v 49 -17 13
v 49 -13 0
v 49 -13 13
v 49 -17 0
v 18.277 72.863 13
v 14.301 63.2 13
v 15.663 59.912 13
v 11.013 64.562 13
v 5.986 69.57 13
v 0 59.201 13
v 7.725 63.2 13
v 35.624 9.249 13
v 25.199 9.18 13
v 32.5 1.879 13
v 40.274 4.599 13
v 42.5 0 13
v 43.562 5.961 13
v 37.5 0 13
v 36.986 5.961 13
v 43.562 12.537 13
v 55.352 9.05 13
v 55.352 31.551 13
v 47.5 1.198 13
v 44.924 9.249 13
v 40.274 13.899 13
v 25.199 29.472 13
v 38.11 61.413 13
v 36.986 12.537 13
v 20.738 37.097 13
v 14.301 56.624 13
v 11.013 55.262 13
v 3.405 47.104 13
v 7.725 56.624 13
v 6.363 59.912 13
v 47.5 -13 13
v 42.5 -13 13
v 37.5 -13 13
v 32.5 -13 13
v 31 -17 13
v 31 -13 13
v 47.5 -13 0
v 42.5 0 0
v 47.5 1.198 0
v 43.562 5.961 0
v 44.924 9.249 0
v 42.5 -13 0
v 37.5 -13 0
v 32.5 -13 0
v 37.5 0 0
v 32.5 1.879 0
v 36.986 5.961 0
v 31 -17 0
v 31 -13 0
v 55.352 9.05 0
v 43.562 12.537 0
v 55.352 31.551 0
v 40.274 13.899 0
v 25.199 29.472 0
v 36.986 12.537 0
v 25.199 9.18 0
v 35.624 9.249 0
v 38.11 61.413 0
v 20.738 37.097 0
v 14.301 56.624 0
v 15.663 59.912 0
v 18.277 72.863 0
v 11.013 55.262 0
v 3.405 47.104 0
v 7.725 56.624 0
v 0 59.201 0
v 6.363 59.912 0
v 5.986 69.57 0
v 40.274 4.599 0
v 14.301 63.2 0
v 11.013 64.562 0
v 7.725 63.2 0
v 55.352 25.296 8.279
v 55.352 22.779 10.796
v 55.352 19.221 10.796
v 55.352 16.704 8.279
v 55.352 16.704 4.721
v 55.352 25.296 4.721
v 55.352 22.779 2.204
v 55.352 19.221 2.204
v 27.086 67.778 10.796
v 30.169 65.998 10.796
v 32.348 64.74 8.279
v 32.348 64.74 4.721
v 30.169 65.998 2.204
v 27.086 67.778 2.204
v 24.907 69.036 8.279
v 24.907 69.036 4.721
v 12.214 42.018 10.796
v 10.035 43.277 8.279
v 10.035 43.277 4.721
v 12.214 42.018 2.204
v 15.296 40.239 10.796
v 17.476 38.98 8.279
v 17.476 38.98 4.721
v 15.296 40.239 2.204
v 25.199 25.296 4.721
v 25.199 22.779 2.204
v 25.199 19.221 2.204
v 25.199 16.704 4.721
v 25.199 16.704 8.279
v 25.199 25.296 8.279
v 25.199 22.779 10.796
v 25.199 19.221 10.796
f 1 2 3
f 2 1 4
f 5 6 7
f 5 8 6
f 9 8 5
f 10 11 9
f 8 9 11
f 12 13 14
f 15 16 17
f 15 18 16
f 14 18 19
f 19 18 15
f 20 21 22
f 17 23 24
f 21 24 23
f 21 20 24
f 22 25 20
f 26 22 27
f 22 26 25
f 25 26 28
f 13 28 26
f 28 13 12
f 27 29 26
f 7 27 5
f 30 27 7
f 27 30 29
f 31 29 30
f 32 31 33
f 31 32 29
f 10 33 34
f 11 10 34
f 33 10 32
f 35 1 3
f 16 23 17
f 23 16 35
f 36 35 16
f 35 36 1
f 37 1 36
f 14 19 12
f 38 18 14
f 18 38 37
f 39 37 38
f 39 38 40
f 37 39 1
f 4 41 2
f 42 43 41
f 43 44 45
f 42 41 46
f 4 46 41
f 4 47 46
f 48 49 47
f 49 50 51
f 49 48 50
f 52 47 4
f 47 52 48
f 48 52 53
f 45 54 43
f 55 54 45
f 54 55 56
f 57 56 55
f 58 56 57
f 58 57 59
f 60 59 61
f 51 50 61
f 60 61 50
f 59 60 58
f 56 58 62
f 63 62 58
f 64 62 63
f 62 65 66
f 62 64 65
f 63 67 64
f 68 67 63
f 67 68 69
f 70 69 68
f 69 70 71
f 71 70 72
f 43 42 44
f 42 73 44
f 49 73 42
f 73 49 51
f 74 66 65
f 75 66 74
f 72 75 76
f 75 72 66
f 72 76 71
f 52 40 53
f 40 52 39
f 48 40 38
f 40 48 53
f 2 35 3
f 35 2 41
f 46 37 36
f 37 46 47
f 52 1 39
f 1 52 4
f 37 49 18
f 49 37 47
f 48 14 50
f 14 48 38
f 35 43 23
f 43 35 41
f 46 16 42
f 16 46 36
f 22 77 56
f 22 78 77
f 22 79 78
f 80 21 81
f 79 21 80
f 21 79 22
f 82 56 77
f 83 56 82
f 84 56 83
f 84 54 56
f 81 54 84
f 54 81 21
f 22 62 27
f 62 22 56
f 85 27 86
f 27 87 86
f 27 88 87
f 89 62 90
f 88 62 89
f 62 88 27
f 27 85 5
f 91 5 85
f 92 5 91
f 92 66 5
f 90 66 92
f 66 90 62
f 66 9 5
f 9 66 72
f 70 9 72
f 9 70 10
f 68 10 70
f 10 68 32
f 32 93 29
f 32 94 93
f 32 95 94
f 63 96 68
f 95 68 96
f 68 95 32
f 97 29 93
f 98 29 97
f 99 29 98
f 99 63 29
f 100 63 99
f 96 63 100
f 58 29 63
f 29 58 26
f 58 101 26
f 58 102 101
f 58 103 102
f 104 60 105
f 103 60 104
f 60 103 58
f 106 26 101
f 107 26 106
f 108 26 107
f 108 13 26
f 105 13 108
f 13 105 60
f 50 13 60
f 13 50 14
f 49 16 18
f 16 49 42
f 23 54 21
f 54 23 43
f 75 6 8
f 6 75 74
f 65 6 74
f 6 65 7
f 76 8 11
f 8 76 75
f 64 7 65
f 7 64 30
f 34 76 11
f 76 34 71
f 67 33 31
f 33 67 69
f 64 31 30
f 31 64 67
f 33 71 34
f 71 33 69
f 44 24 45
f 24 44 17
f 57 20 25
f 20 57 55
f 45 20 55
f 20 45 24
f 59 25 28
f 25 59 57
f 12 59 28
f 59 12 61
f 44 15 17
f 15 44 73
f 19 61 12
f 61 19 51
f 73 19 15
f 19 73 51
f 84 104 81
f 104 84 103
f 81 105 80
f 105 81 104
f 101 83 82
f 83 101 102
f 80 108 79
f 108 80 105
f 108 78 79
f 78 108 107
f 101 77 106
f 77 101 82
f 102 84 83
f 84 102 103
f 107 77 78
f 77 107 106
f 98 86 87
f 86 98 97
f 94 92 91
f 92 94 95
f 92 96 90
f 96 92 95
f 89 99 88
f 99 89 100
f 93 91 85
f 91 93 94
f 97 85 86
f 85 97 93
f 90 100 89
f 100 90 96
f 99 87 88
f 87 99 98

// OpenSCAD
// Parametric Frame Vertex by Tonokip
// 2009.02.08
// Vertex Body derived from: frame-vertex_6off.aoi::body - edges
// http://reprap.svn.sourceforge.net/viewvc/reprap/trunk/mendel/mechanics/solid-models/cartesian-robot-m4/printed-parts/
// Fixed body geometry flaw per http://dev.forums.reprap.org/read.php?1,30132,30398
// License GNU GPL v2 or newer.

M3=4.3; 
M8=9.3;
vertex_height=13;
with_foot=1;		// Comment out for no foot.

FN=8;

translate ([0,0,vertex_height/2])difference() 
{
	union () {
		dxf_linear_extrude(file = "vertex-body-fixed-qcad.dxf",height=vertex_height,center=true);
		//import_stl("vertex-body-fixed.stl");
		if (with_foot==1) {
			translate([40,-15,0]) vertex_foot();
		}
	}

	translate([11.013,59.912]) zhole(M8); 
	//translate([35.013,39.999,0]) zhole(M8); 
	translate([40.274,9.249,0]) zhole(M8); 
	//translate([40.217,30.992]) zhole(M3); 
	//translate([29.829,48.986]) zhole(M3); 
	translate([0,21,0]) 
		xteardrop(M8,200);
	translate([13.687,41.010,0]) rotate(a=60,v=[0,0,1])
		xteardrop(M8,200);
}


module zhole(diameter) cylinder(h=100,r=(diameter/2),center=true,$fn=FN); 

module xteardrop(diameter,length) rotate(a=-90,v=[0,1,0]) rotate(a=-90,v=[0,0,1]) zteardrop(diameter,length);

module yteardrop(diameter,length) rotate(a=90,v=[1,0,0]) zteardrop(diameter,length);

module zteardrop(diameter,height)
{
	rotate(a=0, v=[0,0,1]) union()
	{
		//translate([0,0,-height/2]) cube(size=[diameter/2,diameter/2,height],center=false);
		rotate(a=22.5, v=[0,0,1])cylinder(r=diameter/2, h = height,center=true,$fn=FN);
	}
}

module vertex_foot() {
	difference () {
		union () {
			cube([18,4,vertex_height],center=true);
			translate ([-5,8,0]) cube([5,18,vertex_height],center=true);
			translate ([5,9,0]) cube([5,18,vertex_height],center=true);
		}
		//translate ([0,8,0]) xteardrop(7,200);
	}
}
